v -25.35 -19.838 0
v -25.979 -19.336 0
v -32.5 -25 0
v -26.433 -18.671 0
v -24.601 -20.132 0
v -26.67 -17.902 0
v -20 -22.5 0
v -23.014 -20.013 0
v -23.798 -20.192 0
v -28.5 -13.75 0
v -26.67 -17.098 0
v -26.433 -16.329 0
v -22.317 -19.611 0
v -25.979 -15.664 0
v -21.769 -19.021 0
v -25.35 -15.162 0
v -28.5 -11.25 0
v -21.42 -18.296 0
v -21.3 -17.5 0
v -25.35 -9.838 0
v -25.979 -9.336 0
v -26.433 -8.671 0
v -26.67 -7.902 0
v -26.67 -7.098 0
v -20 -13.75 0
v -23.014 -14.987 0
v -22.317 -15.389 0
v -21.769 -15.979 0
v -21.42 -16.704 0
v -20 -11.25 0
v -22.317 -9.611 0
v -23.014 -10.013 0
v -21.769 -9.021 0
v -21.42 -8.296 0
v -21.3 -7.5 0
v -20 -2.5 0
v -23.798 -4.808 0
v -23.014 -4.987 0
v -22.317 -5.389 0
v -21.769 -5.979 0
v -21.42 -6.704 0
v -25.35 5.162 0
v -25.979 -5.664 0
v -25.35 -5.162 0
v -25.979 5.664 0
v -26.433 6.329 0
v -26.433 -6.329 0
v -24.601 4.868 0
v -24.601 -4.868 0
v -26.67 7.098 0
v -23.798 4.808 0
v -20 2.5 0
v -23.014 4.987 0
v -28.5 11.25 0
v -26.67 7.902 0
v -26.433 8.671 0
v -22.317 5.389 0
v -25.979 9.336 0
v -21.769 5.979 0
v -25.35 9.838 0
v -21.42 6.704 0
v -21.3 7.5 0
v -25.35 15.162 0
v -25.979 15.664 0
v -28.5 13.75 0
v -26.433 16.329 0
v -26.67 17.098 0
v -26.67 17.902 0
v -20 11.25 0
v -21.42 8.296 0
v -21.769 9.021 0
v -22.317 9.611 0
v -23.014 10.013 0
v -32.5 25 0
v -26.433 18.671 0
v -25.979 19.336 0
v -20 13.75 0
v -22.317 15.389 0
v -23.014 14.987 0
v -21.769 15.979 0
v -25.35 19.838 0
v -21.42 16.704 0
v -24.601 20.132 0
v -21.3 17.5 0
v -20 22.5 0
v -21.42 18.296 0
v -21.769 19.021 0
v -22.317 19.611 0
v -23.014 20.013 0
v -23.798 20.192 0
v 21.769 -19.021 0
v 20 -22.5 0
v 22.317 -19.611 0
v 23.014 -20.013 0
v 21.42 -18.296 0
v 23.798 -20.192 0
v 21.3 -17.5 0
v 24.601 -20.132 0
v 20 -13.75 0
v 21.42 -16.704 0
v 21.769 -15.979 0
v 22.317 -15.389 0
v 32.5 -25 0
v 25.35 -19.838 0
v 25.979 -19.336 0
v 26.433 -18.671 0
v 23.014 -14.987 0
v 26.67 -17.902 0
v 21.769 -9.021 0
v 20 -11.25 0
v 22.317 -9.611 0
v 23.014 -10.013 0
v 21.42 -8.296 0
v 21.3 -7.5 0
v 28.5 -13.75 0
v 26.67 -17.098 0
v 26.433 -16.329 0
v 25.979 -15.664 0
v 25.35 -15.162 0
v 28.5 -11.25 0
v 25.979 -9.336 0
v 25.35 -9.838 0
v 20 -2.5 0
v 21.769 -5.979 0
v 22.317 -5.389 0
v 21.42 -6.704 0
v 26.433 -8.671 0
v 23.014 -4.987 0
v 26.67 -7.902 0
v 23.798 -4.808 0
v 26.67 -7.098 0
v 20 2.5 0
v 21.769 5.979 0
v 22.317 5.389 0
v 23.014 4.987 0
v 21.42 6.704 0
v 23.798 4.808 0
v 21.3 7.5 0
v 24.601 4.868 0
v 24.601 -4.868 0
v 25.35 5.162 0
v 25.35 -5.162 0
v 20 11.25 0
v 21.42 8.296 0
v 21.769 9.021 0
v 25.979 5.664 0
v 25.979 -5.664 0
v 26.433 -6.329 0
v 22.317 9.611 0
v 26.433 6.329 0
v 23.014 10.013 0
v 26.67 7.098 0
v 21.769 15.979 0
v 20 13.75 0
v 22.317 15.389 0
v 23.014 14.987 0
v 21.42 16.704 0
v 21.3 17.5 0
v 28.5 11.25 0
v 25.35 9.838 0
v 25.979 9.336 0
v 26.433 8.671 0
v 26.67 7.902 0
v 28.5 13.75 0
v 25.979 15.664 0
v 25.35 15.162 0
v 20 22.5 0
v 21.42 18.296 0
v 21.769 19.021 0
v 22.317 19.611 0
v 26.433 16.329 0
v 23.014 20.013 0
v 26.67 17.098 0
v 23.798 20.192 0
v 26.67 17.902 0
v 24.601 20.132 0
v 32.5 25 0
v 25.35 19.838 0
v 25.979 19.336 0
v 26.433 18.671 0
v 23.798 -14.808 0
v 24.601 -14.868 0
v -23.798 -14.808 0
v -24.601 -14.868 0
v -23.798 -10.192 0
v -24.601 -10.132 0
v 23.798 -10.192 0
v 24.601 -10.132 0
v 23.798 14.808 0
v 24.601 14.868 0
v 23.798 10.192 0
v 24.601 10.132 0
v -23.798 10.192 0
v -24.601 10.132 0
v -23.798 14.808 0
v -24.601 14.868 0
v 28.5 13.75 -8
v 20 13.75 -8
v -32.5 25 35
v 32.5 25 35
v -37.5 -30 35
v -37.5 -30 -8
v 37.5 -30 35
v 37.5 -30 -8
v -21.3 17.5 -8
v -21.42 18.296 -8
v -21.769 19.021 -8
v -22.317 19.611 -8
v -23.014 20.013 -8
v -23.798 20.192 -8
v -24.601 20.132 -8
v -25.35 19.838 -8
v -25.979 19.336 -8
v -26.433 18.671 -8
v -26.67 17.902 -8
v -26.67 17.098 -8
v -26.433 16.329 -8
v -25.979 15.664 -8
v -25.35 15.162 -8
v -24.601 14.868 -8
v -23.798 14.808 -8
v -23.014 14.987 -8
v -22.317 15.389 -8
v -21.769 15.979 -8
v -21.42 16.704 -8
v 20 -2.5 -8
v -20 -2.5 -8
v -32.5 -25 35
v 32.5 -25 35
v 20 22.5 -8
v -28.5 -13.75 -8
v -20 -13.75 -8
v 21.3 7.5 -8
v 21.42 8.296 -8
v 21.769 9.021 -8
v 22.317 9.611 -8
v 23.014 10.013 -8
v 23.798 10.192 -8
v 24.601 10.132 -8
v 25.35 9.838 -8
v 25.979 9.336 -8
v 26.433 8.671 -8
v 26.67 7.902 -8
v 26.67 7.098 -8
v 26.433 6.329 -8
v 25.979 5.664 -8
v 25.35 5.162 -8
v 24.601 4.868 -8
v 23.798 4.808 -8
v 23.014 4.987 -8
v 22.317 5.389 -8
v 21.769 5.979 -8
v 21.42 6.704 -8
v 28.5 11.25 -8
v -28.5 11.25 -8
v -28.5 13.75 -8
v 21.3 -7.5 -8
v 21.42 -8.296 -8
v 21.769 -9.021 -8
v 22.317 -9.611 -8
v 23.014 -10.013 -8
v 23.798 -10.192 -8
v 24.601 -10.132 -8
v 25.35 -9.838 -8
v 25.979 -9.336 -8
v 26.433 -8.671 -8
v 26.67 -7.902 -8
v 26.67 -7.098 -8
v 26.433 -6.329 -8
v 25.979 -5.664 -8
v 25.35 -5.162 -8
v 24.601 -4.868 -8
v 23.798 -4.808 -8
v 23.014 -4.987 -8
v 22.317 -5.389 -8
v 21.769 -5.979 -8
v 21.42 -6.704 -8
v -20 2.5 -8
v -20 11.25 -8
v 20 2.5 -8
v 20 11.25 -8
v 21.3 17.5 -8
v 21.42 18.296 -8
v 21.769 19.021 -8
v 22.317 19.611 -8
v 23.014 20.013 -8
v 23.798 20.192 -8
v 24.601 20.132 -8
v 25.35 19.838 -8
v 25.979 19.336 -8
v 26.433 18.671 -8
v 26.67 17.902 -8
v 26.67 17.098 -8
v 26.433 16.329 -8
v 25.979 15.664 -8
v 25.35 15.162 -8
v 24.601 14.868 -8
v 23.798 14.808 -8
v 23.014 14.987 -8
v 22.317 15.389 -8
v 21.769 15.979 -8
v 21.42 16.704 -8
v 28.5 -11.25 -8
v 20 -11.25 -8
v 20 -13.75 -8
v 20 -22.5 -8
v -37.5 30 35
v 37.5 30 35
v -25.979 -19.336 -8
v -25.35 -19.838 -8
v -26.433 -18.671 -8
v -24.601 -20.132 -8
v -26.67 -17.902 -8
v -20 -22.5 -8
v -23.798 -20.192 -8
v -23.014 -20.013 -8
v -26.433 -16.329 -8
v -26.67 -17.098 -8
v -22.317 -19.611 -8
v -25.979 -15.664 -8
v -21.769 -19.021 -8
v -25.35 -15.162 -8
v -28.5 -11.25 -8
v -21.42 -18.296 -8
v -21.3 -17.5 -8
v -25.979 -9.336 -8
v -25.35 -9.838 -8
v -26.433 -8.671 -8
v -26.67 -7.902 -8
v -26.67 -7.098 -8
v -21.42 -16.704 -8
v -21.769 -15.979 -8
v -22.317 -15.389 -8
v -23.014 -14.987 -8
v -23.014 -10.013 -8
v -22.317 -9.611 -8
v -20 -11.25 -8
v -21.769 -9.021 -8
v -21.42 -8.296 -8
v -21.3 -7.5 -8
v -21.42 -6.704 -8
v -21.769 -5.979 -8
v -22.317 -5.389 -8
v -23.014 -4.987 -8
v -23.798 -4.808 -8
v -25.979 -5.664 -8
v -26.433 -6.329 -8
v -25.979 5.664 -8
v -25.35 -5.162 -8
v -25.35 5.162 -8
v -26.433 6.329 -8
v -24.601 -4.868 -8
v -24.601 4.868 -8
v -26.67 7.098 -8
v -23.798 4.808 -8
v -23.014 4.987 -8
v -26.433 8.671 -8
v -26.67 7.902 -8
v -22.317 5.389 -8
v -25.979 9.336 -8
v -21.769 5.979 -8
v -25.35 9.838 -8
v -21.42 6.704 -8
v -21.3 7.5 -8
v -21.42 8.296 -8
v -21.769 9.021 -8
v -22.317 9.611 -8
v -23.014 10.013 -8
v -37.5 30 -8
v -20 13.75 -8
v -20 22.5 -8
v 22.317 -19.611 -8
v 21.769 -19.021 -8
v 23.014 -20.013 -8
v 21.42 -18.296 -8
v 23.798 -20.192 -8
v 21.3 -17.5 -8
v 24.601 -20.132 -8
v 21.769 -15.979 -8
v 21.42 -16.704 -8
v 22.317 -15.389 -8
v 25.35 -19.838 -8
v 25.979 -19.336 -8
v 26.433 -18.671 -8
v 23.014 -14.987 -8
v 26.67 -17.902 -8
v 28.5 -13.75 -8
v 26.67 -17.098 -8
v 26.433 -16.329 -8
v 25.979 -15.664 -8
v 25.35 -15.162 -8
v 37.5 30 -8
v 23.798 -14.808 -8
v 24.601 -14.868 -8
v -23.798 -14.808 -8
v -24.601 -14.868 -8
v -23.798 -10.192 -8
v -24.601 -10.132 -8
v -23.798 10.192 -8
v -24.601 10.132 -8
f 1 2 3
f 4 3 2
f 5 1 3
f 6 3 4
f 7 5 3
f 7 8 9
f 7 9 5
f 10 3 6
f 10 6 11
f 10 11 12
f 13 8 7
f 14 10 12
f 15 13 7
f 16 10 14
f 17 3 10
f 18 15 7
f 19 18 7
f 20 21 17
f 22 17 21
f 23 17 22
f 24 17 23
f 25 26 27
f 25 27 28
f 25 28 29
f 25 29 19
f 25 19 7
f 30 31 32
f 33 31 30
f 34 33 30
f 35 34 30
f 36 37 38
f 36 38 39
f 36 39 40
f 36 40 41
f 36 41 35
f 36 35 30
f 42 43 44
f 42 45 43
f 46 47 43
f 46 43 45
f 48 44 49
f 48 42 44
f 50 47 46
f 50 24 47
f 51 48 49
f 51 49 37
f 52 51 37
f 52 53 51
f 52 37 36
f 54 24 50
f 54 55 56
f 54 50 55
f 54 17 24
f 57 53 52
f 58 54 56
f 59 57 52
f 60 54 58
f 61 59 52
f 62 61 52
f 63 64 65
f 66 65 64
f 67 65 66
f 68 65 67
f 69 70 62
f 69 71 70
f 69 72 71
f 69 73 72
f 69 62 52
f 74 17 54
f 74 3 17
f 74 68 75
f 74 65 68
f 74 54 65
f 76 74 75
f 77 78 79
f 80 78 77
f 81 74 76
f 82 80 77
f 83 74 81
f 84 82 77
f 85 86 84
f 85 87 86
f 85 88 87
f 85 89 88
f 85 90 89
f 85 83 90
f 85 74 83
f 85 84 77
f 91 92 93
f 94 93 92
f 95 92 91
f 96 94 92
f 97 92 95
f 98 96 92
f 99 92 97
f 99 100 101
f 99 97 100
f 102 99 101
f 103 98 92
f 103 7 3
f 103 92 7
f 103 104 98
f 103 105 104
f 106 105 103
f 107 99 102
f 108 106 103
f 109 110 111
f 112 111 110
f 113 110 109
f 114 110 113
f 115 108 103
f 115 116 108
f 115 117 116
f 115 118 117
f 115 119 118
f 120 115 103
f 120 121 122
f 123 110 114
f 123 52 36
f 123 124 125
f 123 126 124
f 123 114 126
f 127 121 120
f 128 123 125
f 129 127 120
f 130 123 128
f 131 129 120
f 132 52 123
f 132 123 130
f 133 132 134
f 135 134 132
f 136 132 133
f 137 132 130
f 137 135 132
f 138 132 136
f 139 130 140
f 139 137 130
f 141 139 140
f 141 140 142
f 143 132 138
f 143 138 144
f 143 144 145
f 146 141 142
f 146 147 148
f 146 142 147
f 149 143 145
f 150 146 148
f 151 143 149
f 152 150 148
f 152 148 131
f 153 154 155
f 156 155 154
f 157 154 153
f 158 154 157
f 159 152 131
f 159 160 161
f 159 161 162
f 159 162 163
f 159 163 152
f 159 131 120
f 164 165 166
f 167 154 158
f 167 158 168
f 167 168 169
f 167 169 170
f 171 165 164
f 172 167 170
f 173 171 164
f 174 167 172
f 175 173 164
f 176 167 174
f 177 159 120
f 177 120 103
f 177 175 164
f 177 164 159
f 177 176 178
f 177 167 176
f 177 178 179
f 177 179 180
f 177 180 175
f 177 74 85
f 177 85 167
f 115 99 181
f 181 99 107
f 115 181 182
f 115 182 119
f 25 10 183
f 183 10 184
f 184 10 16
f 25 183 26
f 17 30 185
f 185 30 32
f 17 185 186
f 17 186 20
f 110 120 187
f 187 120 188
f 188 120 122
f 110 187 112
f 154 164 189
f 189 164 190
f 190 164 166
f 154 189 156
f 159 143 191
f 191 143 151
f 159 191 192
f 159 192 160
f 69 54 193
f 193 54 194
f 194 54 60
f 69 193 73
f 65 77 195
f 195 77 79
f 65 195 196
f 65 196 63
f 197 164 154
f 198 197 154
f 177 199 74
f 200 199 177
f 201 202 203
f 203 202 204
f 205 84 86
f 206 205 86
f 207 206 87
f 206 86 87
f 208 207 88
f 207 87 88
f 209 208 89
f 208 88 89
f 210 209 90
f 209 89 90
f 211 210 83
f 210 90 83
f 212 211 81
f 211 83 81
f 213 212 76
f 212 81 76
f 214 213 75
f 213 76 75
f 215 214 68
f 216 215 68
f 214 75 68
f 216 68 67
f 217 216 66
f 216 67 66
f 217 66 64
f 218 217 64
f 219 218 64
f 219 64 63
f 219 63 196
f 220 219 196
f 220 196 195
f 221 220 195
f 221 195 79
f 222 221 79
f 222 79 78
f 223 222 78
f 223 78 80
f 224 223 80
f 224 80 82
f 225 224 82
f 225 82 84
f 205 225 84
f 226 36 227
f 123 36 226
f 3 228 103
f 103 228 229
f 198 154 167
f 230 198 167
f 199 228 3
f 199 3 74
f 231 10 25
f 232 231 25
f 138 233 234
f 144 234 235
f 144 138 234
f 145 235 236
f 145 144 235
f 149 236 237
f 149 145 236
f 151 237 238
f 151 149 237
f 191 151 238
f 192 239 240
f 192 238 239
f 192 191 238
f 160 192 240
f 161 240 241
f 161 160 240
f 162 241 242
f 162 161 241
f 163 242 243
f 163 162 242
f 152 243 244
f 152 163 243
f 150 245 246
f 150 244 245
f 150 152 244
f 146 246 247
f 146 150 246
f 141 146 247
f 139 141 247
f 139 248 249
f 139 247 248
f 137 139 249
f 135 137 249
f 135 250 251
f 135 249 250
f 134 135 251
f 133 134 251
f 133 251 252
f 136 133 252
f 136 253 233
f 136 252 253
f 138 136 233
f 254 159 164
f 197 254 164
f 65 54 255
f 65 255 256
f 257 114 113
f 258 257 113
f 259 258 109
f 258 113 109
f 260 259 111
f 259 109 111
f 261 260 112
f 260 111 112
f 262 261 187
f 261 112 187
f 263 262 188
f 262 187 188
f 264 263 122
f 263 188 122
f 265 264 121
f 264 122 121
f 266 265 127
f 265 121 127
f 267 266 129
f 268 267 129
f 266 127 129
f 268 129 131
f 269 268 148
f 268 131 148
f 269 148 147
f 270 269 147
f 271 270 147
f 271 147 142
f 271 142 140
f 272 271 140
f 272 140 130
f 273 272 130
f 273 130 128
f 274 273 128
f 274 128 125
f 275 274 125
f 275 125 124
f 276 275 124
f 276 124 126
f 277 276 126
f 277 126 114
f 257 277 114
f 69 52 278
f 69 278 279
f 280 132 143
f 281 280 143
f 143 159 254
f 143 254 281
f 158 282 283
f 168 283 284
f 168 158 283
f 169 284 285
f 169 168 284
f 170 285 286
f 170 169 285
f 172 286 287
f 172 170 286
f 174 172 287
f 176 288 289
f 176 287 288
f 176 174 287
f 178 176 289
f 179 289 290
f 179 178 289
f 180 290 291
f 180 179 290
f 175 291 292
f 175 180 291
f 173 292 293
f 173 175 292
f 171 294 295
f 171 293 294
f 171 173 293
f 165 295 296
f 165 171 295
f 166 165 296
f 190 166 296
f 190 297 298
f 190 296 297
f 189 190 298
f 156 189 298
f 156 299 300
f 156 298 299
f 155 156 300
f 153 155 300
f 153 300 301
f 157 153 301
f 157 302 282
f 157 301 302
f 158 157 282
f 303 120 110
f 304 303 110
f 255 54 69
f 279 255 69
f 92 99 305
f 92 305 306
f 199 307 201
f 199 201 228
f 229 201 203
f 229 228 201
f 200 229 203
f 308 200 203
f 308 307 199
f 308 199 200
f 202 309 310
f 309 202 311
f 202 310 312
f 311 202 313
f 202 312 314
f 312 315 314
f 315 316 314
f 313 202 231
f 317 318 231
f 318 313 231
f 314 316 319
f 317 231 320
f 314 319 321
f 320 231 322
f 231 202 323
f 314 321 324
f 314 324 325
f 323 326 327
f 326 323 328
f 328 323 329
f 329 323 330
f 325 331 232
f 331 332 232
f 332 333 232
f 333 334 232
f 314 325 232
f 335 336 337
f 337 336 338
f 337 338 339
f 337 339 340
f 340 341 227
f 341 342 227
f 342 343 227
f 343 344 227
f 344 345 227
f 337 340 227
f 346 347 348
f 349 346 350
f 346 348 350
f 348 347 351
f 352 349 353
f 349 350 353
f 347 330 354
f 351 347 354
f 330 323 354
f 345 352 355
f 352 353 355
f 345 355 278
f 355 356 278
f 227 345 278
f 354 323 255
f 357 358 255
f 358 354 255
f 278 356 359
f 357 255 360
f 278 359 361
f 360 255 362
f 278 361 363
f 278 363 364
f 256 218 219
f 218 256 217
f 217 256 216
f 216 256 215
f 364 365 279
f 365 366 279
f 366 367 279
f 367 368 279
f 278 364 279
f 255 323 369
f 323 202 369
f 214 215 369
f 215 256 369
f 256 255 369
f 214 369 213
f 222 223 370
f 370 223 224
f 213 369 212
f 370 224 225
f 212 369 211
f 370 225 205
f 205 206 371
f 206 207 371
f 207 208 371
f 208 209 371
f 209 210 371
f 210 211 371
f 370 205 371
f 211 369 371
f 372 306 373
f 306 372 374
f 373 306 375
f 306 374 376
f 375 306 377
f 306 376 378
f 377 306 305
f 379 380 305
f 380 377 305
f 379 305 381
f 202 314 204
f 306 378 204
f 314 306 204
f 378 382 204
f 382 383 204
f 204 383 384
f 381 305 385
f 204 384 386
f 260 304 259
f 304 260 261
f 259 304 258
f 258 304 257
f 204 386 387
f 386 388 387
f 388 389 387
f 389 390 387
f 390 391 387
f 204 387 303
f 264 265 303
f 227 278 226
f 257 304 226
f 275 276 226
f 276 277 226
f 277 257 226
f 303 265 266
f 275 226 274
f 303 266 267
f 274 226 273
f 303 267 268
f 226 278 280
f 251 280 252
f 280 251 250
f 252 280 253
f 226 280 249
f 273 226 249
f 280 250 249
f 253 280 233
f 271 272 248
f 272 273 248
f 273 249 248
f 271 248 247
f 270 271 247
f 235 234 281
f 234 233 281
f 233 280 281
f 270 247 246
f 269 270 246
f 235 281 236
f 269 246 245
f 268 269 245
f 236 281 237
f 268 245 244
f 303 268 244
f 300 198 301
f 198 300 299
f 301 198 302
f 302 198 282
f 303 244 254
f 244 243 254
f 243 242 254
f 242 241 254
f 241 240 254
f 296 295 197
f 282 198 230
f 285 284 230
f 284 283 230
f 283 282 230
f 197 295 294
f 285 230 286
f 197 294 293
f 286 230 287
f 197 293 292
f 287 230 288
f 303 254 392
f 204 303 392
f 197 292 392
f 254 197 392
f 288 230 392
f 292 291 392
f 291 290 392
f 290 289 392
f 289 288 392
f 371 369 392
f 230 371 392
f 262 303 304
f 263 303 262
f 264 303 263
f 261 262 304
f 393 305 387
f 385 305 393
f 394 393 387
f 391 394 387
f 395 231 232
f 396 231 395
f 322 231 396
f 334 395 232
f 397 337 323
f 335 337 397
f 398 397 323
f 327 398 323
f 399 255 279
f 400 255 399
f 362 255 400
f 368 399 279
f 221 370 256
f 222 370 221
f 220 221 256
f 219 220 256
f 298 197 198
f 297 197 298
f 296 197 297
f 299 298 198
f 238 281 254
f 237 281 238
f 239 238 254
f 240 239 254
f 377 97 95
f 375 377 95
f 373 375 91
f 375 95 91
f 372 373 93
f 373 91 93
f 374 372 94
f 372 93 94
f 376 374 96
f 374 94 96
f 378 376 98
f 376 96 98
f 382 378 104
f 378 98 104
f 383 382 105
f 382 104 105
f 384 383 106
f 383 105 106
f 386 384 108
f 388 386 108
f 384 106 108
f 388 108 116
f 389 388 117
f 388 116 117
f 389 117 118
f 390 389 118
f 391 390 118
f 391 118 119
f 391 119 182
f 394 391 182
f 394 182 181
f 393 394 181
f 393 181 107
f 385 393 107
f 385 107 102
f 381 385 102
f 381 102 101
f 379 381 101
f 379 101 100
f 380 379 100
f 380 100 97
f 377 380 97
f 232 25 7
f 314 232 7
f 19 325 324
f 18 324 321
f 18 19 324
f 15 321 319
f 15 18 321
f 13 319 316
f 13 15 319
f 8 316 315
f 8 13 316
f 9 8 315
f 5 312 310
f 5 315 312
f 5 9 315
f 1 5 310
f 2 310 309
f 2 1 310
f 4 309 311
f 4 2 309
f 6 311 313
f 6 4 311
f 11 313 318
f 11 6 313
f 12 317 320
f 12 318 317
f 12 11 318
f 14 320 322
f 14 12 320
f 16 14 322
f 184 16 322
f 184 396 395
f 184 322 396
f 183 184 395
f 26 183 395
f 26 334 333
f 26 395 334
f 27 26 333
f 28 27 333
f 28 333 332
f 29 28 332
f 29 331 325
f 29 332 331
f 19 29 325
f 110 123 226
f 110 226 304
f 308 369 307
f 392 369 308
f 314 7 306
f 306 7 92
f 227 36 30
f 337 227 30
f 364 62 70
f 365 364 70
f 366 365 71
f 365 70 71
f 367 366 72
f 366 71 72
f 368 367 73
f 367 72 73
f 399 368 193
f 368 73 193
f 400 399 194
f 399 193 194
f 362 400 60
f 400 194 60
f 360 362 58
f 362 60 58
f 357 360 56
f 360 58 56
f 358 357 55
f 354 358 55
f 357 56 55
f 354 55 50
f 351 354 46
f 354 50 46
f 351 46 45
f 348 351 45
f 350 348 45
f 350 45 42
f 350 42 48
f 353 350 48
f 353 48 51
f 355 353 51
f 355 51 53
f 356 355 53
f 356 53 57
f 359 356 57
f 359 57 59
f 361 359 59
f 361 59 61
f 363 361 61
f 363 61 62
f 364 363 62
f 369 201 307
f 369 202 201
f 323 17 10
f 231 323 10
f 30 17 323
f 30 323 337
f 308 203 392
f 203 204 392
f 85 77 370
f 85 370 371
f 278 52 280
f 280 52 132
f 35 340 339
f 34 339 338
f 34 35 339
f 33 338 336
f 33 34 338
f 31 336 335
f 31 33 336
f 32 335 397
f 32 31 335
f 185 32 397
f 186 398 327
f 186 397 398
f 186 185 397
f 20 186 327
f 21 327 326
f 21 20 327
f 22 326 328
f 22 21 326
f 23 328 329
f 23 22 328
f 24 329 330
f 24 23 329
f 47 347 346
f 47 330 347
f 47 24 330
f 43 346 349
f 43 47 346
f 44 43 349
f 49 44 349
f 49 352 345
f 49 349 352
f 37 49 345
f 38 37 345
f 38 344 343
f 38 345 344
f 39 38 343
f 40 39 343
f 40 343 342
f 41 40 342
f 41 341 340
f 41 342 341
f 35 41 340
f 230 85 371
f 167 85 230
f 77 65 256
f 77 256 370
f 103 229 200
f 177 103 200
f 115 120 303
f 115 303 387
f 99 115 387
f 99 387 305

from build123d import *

# Parameters (mm, degrees)
ESQUISSE1_W               = 75
ESQUISSE1_H               = 60
BOSS_EXTRU_1_DEPTH        = 8
ESQUISSE2_W               = 40
ESQUISSE2_H               = 20
ENL_V_MAT_EXTRU_1_DEPTH   = 8
ESQUISSE3_W               = 8.5
ESQUISSE3_H               = 2.5
ENL_V_MAT_EXTRU_2_DEPTH   = 8
ESQUISSE4_R               = 2.7
ENL_V_MAT_EXTRU_3_DEPTH   = 49.685213361
SYM_TRIE4_COPY_1_SKETCH_W = 8.5
SYM_TRIE4_COPY_1_SKETCH_H = 2.5
SYM_TRIE4_COPY_1_DEPTH    = 8
SYM_TRIE4_COPY_2_SKETCH_R = 2.7
SYM_TRIE4_COPY_2_DEPTH    = 49.685213361
ESQUISSE6_W               = 75
ESQUISSE6_H               = 60
BOSS_EXTRU_2_DEPTH        = 35
ESQUISSE7_W               = 65
ESQUISSE7_H               = 50
ENL_V_MAT_EXTRU_4_DEPTH   = 35


with BuildPart() as part:
    # Esquisse1 → Boss.-Extru.1 (new body)
    with BuildSketch(Plane.XY):
        Rectangle(ESQUISSE1_W, ESQUISSE1_H)
    extrude(amount=-BOSS_EXTRU_1_DEPTH)

    # Esquisse2 → Enlèv. mat.-Extru.1 (cut)
    with BuildSketch(Plane.XY):
        with Locations((0, 12.5)):
            Rectangle(ESQUISSE2_W, ESQUISSE2_H)
    enl_v_mat_extru_1 = extrude(amount=-ENL_V_MAT_EXTRU_1_DEPTH, mode=Mode.SUBTRACT)

    # Esquisse3 → Enlèv. mat.-Extru.2 (cut)
    with BuildSketch(Plane.XY):
        with Locations((-24.25, 12.5)):
            Rectangle(ESQUISSE3_W, ESQUISSE3_H)
    enl_v_mat_extru_2 = extrude(amount=-ENL_V_MAT_EXTRU_2_DEPTH, mode=Mode.SUBTRACT)

    # Esquisse4 → Enlèv. mat.-Extru.3 (cut, through all)
    with BuildSketch(Plane.XY):
        with Locations((-24, 17.5)):
            Circle(ESQUISSE4_R)
        with Locations((-24, 7.5)):
            Circle(ESQUISSE4_R)
    enl_v_mat_extru_3 = extrude(amount=-ENL_V_MAT_EXTRU_3_DEPTH, mode=Mode.SUBTRACT)

    # Symétrie2: Enlèv. mat.-Extru.2, Enlèv. mat.-Extru.3 across plane
    add(enl_v_mat_extru_2.mirror(Plane(origin=(0, 0, 0), x_dir=(0, 0, 1), z_dir=(1, 0, 0))), mode=Mode.SUBTRACT)
    add(enl_v_mat_extru_3.mirror(Plane(origin=(0, 0, 0), x_dir=(0, 0, 1), z_dir=(1, 0, 0))), mode=Mode.SUBTRACT)

    # Symétrie4: Enlèv. mat.-Extru.1, Enlèv. mat.-Extru.2, Enlèv. mat.-Extru.3 across plane
    add(enl_v_mat_extru_1.mirror(Plane.ZX), mode=Mode.SUBTRACT)
    add(enl_v_mat_extru_2.mirror(Plane.ZX), mode=Mode.SUBTRACT)
    add(enl_v_mat_extru_3.mirror(Plane.ZX), mode=Mode.SUBTRACT)

    # Symétrie4 copy 1 sketch → Symétrie4 copy 1 (cut)
    with BuildSketch(Plane(origin=(0, 0, 0), x_dir=(-1, 0, 0), z_dir=(0, 0, 1))):
        with Locations((-24.25, 12.5)):
            Rectangle(SYM_TRIE4_COPY_1_SKETCH_W, SYM_TRIE4_COPY_1_SKETCH_H)
    extrude(amount=-SYM_TRIE4_COPY_1_DEPTH, mode=Mode.SUBTRACT)

    # Symétrie4 copy 2 sketch → Symétrie4 copy 2 (cut, through all)
    with BuildSketch(Plane(origin=(0, 0, 0), x_dir=(-1, 0, 0), z_dir=(0, 0, 1))):
        with Locations((-24, 17.5)):
            Circle(SYM_TRIE4_COPY_2_SKETCH_R)
        with Locations((-24, 7.5)):
            Circle(SYM_TRIE4_COPY_2_SKETCH_R)
    extrude(amount=-SYM_TRIE4_COPY_2_DEPTH, mode=Mode.SUBTRACT)

    # Esquisse6 → Boss.-Extru.2 (add)
    with BuildSketch(Plane.XY):
        Rectangle(ESQUISSE6_W, ESQUISSE6_H)
    extrude(amount=BOSS_EXTRU_2_DEPTH)

    # Esquisse7 → Enlèv. mat.-Extru.4 (cut)
    with BuildSketch(Plane.XY.offset(35)):
        Rectangle(ESQUISSE7_W, ESQUISSE7_H)
    extrude(amount=-ENL_V_MAT_EXTRU_4_DEPTH, mode=Mode.SUBTRACT)


solid = part.part
